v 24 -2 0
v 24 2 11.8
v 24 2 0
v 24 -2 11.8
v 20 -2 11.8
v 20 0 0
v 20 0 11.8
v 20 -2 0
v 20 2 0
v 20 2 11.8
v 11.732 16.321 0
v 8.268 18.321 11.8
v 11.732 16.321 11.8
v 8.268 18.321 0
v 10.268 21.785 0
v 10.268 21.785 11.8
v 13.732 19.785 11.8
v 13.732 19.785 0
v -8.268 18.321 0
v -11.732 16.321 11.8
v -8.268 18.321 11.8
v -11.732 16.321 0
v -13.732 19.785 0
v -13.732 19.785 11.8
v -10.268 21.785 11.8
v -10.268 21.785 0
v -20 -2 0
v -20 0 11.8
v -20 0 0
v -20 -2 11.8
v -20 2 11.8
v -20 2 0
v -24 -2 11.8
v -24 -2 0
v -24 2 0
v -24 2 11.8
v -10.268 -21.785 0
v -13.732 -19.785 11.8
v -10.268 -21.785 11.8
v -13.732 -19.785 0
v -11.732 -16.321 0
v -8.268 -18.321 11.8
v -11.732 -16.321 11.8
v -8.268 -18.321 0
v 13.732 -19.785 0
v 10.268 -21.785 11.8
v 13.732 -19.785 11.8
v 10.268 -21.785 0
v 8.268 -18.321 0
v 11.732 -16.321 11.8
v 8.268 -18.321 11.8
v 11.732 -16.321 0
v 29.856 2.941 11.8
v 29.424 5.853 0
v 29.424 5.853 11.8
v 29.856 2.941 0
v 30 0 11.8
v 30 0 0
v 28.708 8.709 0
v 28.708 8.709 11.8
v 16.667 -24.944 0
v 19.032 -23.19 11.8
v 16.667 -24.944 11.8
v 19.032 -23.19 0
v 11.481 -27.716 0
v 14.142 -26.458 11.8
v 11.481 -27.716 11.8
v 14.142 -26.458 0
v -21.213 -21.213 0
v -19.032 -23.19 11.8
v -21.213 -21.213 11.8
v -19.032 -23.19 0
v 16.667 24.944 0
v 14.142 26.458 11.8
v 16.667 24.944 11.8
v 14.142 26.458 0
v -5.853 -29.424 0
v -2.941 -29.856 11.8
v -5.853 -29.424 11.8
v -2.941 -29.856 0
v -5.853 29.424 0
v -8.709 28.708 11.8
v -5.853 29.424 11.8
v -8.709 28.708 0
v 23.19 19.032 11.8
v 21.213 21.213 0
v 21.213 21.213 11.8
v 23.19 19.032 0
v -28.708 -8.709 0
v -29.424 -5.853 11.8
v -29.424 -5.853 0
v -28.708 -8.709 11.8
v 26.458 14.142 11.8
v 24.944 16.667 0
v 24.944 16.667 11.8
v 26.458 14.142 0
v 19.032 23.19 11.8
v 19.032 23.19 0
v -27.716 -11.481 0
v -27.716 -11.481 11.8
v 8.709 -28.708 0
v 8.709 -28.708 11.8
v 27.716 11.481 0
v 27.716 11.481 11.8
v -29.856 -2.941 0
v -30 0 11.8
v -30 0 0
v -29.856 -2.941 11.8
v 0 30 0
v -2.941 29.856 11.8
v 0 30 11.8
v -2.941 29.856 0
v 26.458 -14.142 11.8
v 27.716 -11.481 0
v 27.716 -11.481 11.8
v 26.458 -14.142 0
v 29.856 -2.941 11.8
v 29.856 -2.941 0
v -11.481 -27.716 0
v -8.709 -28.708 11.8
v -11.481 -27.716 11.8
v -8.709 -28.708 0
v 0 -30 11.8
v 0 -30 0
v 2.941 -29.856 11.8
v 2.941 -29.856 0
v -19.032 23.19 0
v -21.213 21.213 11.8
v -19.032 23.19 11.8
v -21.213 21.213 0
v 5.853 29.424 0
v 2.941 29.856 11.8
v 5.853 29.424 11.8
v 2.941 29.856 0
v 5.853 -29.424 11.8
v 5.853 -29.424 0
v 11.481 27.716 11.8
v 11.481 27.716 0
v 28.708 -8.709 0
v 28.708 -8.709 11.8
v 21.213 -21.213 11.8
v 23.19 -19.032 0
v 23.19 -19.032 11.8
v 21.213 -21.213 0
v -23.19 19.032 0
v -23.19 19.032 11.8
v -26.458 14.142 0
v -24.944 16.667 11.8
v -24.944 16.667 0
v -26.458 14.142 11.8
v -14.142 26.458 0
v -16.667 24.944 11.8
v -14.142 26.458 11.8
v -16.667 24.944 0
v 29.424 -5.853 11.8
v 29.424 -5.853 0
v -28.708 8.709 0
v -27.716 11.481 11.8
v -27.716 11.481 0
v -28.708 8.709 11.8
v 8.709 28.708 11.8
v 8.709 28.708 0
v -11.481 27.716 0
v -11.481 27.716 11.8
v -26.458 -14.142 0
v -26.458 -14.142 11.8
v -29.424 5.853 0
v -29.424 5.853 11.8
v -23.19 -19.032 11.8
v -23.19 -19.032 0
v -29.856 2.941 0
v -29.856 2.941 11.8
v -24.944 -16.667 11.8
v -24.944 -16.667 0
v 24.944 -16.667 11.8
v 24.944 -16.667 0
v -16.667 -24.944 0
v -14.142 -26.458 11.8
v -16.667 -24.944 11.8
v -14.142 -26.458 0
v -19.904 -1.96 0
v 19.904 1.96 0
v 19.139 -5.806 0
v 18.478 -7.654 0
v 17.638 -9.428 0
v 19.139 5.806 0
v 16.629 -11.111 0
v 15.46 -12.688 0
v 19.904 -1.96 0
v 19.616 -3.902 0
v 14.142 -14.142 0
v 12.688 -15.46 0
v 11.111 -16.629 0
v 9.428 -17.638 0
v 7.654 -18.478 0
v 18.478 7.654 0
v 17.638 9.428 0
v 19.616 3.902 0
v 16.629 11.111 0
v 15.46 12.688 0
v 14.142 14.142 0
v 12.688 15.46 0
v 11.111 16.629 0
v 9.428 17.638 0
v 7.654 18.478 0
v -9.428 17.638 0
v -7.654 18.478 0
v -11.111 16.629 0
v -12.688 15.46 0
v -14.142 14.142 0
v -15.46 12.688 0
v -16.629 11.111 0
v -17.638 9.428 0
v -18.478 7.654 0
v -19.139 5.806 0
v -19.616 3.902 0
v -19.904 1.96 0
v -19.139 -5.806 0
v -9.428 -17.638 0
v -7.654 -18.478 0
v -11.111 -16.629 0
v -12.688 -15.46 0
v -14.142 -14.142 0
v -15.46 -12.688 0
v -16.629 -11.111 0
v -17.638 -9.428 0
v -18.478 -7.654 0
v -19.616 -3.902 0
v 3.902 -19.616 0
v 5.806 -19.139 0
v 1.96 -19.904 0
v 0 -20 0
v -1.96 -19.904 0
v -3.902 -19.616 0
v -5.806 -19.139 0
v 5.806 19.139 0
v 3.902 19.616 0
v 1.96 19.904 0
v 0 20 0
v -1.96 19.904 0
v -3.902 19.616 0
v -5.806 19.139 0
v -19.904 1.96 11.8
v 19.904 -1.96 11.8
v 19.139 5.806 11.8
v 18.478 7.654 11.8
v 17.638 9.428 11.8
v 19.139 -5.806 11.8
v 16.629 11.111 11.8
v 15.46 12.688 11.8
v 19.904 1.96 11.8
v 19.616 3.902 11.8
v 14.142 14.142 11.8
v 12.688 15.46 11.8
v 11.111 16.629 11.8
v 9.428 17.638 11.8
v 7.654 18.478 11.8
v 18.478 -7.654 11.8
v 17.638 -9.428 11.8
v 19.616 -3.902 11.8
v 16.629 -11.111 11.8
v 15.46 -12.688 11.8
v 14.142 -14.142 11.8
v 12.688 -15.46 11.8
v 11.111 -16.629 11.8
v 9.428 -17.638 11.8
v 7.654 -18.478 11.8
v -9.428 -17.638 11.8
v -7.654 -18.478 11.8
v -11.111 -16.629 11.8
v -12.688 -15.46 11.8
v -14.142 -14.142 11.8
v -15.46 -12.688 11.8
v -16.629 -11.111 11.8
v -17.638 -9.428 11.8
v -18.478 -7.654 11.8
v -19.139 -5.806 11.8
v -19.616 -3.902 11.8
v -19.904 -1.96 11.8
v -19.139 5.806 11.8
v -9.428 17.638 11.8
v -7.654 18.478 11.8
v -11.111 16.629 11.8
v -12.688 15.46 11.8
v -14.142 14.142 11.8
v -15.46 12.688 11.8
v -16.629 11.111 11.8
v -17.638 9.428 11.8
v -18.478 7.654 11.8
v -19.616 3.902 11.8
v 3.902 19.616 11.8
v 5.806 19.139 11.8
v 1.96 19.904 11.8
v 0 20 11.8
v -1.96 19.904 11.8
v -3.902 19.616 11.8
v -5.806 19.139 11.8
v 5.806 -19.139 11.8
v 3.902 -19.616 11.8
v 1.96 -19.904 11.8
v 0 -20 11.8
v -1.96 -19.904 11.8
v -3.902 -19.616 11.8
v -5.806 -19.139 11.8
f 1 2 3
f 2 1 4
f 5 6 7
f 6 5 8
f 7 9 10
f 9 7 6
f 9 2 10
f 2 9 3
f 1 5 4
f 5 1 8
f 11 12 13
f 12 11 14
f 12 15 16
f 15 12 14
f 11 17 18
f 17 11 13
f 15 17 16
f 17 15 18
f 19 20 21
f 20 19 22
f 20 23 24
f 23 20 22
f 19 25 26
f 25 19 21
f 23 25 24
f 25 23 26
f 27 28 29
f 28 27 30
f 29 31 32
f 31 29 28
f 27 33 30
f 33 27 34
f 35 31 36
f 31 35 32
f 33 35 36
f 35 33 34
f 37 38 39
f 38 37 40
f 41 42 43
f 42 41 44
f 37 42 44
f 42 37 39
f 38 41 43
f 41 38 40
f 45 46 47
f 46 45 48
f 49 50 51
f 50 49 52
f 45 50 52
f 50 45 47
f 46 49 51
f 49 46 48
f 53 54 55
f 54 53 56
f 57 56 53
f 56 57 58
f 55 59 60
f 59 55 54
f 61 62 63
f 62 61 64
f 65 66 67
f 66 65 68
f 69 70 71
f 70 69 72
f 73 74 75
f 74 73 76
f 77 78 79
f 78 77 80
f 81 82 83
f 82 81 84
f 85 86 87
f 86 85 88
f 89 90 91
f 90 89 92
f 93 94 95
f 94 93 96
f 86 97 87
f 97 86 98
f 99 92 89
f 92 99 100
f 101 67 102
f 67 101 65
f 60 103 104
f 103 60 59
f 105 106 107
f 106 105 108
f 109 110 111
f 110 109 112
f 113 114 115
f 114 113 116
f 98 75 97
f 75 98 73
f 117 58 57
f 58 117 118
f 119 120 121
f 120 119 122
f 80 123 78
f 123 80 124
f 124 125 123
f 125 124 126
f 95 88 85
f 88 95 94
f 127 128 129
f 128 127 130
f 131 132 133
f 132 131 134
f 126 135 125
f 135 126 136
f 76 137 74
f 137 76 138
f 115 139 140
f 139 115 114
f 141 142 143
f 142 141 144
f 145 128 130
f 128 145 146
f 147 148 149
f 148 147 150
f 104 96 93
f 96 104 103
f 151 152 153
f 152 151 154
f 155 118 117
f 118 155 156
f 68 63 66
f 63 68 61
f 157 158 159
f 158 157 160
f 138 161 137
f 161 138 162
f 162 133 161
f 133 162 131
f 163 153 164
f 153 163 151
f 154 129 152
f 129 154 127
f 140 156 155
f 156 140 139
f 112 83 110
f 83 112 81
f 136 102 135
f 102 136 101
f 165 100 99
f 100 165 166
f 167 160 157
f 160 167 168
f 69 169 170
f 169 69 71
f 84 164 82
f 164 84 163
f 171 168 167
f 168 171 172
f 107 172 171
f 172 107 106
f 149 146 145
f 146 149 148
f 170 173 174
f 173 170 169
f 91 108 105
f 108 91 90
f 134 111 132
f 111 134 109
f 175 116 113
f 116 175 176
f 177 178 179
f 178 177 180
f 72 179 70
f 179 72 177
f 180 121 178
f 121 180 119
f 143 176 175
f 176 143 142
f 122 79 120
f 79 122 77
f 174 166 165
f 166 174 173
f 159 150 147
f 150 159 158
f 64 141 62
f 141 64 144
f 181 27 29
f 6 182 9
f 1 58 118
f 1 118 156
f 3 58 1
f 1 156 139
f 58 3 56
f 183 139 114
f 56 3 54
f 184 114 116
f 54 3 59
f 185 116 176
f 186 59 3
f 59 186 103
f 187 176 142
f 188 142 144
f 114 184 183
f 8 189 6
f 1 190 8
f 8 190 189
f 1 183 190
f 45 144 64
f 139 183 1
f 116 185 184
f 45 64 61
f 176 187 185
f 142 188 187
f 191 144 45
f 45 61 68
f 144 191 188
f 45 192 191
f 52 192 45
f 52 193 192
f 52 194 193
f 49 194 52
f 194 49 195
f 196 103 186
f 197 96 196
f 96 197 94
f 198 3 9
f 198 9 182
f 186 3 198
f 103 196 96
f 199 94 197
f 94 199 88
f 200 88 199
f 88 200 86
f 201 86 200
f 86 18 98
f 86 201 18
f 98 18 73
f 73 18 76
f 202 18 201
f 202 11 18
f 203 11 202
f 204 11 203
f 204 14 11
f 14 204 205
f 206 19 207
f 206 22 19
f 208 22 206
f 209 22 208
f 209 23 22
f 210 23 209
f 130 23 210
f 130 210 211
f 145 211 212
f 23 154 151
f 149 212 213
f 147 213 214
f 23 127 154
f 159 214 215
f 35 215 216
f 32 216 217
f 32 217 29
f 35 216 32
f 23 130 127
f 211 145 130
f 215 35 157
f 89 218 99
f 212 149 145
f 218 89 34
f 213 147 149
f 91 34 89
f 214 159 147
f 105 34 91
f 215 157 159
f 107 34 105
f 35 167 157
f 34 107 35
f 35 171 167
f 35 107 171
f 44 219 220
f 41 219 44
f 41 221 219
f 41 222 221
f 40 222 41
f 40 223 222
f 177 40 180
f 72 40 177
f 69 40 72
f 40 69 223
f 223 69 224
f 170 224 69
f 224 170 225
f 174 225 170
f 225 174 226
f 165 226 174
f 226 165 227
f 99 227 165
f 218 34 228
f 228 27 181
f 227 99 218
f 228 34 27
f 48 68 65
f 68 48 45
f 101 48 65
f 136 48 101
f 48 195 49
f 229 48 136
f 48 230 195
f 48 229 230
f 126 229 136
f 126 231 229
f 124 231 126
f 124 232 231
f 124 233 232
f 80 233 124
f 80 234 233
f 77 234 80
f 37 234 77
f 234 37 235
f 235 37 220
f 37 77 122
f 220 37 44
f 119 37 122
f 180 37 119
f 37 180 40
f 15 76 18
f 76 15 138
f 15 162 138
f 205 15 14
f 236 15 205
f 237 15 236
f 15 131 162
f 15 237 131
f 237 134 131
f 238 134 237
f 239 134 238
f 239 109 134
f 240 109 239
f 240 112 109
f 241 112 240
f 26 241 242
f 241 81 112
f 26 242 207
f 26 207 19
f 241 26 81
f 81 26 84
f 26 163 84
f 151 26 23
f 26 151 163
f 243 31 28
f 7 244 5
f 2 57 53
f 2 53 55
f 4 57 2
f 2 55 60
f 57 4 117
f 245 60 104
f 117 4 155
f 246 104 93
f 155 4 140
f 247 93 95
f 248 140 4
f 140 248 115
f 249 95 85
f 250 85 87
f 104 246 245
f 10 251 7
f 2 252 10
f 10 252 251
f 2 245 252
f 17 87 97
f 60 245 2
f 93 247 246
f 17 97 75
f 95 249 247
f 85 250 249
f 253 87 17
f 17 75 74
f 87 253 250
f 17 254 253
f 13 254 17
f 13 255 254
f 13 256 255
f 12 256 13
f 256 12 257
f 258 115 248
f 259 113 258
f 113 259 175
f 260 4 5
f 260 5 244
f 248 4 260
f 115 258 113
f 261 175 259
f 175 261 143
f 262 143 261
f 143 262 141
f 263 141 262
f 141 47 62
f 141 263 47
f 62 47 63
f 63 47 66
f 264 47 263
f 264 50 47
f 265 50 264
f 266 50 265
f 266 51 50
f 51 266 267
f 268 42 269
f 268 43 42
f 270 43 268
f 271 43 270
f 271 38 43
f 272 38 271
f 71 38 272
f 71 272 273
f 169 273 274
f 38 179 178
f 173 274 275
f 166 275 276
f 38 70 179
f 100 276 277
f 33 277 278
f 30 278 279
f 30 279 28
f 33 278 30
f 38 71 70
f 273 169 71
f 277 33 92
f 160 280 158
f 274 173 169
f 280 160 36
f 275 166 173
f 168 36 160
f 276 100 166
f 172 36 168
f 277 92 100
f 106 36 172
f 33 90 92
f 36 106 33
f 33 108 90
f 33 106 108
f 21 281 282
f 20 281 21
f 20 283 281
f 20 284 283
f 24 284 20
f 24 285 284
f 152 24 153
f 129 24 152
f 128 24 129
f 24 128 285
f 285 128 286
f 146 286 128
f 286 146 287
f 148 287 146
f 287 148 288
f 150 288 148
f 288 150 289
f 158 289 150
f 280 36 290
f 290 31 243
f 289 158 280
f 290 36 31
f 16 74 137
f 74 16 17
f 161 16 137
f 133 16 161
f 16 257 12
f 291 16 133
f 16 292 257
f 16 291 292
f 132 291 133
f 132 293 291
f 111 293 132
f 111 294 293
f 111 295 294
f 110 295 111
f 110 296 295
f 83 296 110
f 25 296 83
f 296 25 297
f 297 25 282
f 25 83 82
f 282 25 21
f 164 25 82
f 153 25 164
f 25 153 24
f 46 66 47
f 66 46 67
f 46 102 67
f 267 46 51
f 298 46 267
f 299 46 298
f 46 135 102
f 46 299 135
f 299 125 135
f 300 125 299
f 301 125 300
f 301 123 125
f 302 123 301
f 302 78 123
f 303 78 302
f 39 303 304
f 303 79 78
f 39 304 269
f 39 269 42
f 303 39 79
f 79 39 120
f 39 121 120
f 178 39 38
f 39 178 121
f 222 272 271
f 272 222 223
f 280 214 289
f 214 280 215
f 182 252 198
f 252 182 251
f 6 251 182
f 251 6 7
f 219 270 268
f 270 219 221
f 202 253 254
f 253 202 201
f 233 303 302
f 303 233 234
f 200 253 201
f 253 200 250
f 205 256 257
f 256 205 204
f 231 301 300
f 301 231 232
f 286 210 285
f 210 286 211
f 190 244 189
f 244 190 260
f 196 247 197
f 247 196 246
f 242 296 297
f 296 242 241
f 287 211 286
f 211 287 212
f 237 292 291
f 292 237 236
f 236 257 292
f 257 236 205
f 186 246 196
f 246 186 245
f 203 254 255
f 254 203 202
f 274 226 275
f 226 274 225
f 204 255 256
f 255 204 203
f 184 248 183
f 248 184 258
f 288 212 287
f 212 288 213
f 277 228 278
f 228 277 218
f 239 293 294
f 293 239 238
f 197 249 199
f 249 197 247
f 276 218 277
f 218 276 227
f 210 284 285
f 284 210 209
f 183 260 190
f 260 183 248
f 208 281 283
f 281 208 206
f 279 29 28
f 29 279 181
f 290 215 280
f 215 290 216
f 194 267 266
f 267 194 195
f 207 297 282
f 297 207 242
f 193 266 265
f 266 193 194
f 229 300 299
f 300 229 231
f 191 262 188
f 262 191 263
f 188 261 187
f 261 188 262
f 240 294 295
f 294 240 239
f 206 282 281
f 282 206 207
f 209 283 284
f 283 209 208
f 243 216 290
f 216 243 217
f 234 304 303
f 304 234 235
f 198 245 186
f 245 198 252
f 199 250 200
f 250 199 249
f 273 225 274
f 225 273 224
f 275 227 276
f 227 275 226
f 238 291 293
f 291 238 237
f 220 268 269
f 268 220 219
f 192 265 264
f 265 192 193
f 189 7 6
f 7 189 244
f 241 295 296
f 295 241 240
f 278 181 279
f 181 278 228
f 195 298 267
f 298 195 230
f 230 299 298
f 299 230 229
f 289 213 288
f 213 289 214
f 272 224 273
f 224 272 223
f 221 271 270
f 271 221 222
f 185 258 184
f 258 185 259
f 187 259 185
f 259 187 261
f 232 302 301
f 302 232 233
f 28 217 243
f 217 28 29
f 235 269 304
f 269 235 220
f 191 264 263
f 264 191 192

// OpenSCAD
module ring_with_notches() {
    difference() {
        // Outer ring
        cylinder(h=11.8, r=30, $fn=64);
        
        // Central through-bore
        translate([0, 0, -1])
            cylinder(h=13.8, r=20, $fn=64);
        
        // Rectangular notches
        for (i = [0:5]) {
            rotate([0, 0, i * 60])
                translate([20, -2, -1])
                    cube([4, 4, 13.8]);
        }
    }
}

ring_with_notches();
